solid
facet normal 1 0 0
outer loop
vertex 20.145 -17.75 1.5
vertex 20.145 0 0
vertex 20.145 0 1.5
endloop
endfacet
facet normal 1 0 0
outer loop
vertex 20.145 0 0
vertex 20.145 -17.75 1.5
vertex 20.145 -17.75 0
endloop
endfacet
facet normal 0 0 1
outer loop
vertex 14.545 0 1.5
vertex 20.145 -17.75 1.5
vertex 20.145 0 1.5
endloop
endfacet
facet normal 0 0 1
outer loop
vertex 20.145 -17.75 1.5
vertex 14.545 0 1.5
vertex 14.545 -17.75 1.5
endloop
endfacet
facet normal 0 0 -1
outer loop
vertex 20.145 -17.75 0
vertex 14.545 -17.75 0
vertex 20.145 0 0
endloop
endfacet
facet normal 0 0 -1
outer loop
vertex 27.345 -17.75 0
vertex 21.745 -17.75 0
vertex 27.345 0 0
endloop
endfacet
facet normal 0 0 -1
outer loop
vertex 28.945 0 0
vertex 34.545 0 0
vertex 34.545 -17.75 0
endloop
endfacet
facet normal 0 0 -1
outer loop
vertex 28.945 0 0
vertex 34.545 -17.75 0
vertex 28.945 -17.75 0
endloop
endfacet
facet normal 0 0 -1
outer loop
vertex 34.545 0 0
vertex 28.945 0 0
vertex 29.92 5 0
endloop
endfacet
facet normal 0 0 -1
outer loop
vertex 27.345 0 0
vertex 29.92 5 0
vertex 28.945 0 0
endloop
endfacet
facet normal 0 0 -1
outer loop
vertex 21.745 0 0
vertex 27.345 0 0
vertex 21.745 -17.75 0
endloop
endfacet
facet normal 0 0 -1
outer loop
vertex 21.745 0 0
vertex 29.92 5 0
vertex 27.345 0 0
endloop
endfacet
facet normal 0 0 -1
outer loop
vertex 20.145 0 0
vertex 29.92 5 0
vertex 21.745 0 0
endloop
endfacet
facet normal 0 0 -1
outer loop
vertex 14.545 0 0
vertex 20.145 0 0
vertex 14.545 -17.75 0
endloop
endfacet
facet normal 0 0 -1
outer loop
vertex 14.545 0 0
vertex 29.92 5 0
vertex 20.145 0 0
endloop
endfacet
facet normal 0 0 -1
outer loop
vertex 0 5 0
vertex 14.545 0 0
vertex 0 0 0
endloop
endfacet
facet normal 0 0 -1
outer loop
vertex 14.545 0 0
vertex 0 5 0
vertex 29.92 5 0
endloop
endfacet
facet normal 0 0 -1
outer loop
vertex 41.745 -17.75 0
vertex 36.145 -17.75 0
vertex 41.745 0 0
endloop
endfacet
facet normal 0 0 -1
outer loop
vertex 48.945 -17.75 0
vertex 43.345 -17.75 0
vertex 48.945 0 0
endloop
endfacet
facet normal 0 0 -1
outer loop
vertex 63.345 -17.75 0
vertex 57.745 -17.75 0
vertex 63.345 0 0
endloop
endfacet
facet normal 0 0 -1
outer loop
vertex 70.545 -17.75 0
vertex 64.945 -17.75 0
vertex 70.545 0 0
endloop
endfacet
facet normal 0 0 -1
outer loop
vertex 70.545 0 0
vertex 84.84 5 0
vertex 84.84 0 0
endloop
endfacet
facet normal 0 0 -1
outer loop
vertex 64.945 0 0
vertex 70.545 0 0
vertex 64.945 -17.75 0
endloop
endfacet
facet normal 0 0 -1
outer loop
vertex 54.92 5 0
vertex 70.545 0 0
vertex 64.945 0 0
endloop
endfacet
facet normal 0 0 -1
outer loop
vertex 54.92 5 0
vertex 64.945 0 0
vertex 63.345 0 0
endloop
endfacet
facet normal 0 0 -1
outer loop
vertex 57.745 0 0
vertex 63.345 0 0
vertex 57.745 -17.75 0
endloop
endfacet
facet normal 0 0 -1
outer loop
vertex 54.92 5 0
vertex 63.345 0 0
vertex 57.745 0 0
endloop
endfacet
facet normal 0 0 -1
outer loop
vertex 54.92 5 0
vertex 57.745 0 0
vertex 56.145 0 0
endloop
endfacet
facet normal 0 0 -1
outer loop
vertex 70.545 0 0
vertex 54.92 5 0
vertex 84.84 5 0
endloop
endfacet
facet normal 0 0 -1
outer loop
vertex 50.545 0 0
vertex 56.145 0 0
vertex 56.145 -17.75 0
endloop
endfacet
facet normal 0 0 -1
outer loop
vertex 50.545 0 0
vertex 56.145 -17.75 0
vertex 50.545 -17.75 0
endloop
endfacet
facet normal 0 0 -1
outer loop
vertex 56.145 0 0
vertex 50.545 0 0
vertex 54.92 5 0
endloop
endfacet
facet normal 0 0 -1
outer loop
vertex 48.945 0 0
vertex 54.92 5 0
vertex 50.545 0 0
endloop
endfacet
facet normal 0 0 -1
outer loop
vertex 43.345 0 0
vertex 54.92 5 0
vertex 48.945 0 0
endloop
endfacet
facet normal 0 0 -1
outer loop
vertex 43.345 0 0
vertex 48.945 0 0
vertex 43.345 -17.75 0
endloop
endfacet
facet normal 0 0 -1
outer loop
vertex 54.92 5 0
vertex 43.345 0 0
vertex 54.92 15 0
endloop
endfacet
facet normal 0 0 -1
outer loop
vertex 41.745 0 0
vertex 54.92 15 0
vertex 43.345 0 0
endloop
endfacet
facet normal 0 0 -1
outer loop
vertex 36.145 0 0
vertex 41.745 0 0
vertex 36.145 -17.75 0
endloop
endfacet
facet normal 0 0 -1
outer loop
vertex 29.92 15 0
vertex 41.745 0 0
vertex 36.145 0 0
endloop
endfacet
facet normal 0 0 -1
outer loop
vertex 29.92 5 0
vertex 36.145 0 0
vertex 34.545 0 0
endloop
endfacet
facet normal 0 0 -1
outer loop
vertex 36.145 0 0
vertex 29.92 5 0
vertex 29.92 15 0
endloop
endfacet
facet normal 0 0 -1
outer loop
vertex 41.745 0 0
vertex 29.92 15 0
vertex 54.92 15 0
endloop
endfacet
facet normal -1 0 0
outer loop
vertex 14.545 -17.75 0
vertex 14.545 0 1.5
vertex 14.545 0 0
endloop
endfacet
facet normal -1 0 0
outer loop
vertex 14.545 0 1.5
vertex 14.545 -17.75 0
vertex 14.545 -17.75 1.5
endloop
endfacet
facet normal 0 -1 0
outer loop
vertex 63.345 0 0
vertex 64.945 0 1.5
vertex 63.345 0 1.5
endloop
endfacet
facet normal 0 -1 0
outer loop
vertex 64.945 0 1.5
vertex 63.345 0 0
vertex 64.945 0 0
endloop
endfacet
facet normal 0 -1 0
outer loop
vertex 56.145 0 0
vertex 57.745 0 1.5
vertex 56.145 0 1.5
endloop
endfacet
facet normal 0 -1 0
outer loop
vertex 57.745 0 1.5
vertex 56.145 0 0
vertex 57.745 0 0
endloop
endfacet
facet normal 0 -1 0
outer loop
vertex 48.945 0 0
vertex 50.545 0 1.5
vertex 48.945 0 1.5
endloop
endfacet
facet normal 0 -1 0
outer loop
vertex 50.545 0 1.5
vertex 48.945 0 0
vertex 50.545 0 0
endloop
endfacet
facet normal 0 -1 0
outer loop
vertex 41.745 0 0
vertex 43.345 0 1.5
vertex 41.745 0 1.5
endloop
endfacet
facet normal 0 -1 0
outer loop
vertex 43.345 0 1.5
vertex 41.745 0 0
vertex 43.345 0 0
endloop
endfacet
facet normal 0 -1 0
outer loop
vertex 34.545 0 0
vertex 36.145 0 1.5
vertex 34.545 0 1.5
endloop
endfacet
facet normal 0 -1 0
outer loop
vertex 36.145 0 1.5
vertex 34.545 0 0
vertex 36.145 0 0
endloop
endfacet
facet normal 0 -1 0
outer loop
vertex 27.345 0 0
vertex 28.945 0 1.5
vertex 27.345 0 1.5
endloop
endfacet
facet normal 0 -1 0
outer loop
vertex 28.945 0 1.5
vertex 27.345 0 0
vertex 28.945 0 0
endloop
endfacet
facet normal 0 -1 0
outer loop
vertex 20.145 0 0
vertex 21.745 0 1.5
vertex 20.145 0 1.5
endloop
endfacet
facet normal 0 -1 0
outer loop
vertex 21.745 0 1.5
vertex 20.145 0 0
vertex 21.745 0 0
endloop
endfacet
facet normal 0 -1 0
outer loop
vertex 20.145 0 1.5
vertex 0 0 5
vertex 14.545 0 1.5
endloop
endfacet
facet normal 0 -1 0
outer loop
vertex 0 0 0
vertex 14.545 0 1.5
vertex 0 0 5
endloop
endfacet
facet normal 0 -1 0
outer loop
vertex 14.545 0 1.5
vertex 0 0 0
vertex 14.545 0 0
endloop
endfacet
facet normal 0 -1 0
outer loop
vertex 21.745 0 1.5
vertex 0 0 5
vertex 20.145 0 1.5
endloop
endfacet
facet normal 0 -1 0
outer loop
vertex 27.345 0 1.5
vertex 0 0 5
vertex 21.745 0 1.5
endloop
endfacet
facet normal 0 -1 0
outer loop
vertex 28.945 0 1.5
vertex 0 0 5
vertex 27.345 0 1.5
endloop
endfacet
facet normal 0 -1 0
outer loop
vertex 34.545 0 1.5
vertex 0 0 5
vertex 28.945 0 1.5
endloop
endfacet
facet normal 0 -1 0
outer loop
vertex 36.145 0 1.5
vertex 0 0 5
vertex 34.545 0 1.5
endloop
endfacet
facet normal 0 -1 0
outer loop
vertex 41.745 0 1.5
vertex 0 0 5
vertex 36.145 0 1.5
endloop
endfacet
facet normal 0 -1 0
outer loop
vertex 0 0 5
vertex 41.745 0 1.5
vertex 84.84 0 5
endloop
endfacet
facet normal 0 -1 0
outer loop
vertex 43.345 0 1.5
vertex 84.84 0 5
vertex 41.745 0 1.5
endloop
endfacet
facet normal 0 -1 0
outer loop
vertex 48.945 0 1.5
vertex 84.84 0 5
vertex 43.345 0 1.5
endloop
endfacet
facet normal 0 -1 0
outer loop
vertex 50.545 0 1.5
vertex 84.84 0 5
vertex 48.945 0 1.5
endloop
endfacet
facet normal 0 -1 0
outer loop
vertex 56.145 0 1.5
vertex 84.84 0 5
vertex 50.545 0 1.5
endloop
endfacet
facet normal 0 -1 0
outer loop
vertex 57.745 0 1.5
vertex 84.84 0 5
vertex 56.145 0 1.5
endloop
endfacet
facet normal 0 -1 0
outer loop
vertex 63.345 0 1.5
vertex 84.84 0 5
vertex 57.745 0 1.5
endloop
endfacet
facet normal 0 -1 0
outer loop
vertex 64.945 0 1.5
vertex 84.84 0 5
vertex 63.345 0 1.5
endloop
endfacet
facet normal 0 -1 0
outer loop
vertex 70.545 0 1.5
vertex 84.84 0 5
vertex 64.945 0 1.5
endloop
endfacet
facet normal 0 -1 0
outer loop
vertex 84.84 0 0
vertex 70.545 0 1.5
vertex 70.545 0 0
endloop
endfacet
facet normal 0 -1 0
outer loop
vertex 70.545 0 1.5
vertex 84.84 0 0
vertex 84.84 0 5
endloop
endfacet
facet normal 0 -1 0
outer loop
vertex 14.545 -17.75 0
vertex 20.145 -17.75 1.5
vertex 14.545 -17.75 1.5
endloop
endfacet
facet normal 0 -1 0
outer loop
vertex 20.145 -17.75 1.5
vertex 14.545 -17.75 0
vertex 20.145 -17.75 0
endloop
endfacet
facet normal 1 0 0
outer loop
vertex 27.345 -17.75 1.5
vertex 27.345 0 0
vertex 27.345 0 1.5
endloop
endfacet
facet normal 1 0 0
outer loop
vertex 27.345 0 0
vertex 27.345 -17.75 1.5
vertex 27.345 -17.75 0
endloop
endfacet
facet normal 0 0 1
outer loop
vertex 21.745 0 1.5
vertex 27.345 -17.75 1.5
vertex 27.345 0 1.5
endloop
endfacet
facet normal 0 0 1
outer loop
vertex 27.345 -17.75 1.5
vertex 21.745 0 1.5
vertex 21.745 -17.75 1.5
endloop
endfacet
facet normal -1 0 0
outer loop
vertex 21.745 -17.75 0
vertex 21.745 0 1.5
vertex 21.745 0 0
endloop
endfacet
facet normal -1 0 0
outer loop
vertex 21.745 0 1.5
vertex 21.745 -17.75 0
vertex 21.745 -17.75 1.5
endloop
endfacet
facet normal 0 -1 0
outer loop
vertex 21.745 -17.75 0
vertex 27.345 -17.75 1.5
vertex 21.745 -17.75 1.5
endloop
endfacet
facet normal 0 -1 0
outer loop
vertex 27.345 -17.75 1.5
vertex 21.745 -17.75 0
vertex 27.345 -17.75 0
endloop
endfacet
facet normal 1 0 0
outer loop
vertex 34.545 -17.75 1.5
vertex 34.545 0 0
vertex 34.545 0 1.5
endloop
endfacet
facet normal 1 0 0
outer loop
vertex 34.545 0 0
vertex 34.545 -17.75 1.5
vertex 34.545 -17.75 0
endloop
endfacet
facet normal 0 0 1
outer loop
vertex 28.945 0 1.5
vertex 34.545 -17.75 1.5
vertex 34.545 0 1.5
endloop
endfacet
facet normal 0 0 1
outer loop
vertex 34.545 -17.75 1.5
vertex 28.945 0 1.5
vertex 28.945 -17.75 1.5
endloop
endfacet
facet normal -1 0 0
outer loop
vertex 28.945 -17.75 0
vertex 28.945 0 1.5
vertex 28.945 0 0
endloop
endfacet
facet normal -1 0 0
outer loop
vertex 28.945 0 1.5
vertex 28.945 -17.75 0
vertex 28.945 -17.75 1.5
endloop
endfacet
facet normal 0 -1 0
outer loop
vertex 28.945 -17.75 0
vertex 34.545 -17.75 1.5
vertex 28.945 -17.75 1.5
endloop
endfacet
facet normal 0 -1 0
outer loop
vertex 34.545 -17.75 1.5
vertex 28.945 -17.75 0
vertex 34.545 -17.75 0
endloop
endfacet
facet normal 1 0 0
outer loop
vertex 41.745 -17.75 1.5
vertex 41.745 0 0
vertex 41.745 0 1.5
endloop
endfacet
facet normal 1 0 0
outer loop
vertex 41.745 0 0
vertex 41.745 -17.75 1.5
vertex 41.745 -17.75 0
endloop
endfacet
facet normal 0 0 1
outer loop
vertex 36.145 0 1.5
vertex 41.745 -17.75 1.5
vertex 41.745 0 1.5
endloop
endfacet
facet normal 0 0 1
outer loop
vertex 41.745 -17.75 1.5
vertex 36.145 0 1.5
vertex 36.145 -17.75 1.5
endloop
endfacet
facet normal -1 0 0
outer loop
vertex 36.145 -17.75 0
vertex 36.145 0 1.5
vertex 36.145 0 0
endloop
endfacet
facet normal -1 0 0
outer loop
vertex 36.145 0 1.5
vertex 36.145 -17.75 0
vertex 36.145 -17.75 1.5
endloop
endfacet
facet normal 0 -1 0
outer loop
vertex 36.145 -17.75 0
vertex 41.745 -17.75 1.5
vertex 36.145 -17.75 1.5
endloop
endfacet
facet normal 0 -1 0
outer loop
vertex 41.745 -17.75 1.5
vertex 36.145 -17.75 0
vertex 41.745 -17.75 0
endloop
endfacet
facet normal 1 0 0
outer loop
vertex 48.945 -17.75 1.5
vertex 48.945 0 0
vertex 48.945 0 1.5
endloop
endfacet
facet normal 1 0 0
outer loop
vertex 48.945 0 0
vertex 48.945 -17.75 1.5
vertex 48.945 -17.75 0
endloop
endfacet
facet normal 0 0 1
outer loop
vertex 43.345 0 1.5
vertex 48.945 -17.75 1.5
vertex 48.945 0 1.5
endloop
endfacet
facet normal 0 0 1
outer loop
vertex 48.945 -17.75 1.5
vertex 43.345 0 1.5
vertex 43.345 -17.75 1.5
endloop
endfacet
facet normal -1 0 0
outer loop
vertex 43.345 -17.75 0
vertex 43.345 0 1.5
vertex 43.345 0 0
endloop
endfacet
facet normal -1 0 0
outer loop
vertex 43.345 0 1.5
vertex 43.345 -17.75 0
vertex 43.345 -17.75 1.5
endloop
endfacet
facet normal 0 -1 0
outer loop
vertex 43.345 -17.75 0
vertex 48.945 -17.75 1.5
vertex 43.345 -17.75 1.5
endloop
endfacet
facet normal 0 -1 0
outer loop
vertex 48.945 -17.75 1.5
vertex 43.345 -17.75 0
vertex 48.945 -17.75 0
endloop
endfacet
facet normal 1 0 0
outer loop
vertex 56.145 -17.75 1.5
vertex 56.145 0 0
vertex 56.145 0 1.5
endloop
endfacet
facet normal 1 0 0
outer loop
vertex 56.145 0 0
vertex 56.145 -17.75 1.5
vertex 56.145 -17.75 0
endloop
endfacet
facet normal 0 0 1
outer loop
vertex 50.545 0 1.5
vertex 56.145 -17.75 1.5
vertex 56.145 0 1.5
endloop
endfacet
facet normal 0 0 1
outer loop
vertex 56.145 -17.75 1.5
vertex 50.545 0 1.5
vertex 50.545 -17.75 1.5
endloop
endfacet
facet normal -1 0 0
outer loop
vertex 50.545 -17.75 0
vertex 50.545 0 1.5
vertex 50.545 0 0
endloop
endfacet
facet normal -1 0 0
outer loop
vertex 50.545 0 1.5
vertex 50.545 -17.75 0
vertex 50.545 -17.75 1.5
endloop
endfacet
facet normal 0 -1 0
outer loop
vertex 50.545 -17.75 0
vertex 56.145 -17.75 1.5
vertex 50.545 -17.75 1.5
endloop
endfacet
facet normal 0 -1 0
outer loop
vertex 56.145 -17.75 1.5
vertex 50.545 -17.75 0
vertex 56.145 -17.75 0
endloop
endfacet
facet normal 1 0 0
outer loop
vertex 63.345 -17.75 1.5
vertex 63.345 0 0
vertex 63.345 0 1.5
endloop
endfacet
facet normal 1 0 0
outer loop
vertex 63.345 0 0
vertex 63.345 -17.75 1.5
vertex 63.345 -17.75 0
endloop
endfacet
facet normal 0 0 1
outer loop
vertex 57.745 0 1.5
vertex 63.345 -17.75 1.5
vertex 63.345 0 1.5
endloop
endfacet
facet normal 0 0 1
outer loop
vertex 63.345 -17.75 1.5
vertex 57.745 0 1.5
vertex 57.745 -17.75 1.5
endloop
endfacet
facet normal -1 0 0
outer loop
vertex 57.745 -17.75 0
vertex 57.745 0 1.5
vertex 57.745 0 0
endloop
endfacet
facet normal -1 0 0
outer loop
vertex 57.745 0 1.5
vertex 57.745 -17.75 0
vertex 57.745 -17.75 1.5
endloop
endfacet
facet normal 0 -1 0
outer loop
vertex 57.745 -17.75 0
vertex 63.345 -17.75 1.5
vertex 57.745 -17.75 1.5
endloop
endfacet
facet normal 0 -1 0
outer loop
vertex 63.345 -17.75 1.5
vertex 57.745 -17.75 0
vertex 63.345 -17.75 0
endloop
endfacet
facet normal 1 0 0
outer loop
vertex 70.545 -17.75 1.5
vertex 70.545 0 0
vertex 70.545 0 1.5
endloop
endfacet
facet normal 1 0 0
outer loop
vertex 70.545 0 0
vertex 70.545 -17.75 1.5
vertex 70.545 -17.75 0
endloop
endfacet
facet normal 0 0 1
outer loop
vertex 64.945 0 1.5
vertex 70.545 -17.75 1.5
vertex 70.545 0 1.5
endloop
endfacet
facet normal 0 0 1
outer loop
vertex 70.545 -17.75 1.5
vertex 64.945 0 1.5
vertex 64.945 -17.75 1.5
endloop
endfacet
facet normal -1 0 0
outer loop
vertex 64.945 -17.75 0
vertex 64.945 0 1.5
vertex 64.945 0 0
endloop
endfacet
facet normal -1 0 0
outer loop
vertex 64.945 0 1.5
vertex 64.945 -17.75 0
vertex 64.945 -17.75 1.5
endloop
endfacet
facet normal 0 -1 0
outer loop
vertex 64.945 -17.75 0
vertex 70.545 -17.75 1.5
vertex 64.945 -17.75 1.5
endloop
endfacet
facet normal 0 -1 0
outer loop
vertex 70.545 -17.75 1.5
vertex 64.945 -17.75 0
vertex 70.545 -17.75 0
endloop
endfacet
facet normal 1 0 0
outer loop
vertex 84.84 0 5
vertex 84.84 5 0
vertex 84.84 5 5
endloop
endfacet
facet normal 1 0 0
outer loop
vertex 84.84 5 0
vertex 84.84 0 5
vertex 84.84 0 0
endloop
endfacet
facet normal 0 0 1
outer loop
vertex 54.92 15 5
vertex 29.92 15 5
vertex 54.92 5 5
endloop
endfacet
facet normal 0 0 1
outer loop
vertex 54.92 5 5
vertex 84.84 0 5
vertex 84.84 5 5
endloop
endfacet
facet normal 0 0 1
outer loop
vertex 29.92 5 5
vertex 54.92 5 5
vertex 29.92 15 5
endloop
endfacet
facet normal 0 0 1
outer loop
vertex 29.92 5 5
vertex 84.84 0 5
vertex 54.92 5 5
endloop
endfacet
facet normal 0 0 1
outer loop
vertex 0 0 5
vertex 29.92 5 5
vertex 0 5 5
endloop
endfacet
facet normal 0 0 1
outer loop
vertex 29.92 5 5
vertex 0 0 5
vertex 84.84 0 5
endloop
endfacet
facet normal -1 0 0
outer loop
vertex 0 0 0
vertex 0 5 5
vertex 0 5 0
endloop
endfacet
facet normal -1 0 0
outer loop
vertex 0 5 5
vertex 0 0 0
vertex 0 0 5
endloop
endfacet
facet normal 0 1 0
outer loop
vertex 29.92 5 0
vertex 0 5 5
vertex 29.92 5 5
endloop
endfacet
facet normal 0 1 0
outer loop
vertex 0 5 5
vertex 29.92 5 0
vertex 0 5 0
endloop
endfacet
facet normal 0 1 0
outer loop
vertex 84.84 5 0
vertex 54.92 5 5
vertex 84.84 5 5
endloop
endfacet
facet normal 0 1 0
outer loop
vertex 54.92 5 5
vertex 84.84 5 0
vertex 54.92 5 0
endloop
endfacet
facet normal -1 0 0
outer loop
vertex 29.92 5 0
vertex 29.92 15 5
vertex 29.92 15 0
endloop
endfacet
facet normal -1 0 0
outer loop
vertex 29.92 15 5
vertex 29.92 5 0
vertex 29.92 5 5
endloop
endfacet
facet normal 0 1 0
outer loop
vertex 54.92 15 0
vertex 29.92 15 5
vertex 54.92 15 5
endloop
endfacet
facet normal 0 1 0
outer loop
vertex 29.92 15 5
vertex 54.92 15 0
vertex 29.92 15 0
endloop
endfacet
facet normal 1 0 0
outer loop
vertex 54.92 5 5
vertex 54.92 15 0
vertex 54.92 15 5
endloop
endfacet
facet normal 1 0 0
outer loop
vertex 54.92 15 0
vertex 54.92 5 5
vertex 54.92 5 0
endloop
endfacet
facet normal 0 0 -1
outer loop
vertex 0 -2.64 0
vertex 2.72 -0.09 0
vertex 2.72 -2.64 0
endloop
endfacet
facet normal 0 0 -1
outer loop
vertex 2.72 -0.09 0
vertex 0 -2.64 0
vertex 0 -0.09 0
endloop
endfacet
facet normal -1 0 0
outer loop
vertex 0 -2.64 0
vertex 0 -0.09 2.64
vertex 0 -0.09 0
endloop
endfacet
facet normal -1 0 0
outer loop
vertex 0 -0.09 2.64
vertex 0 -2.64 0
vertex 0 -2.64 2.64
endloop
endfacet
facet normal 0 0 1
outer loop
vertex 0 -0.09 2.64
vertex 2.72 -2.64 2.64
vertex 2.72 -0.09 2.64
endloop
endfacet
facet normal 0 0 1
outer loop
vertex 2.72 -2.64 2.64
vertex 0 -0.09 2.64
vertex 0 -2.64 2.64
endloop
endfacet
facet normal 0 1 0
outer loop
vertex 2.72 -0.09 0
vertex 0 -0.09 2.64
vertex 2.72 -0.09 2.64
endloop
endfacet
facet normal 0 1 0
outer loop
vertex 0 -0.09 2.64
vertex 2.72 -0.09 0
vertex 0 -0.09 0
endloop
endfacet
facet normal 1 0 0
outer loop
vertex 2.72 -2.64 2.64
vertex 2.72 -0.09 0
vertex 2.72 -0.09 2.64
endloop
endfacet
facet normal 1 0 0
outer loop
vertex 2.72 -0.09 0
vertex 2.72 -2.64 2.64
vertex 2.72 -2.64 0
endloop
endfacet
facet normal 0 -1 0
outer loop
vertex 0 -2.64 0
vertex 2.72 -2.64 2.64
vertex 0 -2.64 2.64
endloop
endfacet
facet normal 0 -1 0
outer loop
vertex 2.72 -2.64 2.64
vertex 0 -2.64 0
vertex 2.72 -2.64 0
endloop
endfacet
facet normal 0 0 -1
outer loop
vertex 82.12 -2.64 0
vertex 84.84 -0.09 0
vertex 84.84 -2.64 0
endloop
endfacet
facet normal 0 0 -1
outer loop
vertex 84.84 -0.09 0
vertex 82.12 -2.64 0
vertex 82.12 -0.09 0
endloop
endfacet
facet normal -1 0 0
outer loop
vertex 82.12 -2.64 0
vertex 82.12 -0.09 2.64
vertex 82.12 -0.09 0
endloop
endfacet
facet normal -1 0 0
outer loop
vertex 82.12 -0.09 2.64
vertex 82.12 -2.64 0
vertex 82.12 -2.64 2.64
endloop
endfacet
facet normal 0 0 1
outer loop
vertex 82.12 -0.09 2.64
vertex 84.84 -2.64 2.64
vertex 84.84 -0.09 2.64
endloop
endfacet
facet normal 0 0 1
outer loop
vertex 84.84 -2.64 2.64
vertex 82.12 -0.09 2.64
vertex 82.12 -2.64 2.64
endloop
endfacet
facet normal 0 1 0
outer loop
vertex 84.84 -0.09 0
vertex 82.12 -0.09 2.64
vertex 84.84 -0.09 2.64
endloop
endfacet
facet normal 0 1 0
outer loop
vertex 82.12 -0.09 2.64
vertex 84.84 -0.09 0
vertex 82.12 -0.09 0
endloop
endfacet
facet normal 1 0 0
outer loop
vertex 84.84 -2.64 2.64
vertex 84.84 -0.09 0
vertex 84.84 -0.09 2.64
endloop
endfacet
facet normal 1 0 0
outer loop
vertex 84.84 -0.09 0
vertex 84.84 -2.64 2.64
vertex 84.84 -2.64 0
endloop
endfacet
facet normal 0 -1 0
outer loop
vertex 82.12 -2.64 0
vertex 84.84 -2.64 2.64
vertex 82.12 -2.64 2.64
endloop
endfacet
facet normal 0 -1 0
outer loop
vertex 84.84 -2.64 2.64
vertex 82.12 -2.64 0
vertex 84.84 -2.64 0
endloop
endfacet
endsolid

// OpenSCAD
echo(version=version());

/*
* Customizable Electrophoresis Comb
* 
* Copyright (c) 2016 Adm Chrysler
* www.admchrysler.com
* Licensed under the MIT (MIT-LICENSE.txt) license.
* 
* All values are in millimeters.  Comment or uncomment desired settings.
*
*/

/* Manual settings */
tooth_count = 8; // Number of wells
tooth_width = 5.6; // Width of each tooth
tooth_thickness = 1.5; // Thickness of each tooth
tooth_gap = 1.6; // Spacing between teeth.

tooth_length = 17.75;  // Length of teeth (measured perpendicular from comb)
tooth_margin = 14.545; // Width reserved on either end of comb to be free of teeth.

/*8 Tooth settings
tooth_count = 8; tooth_width = 5.8; tooth_thickness = 1.5; tooth_gap = 1.6; tooth_length = 17.75; tooth_margin = 14.545;*/

/*15 Tooth settings
 tooth_count = 15; tooth_width = 2.8; tooth_thickness = 1.5; tooth_gap = 1.0; tooth_length = 17.75; tooth_margin = 14.545;*/
 
// Compatible with Bio-RAD baths.  Do not modify the following settings  
// unless you are using another manufacture.
// Upper Body
    body_x = 84.84;
    body_z = 5;
    body_y = 5;
// Handle
    handle_x = 25;
    handle_z = 5;
    handle_y = 10;
// Support blocks
    support_x = 2.72;
    support_y = 2.55;
    support_z = 2.64;


/* Translating and building dimensions */ 

// Upper body
    cube([body_x, body_y, body_z], center = false);
// Handle
    translate([(body_x-handle_x)/2, body_y, 0])
    linear_extrude(height = handle_z)
    square([handle_x, handle_y], center = false);
// Support block left
    translate([0, -support_z, 0])
    linear_extrude(height = support_z)
    square([support_x, support_y], center = false);
// Support block right
    translate([body_x-support_x, -support_z, 0])
    linear_extrude(height = support_z)
    square([support_x, support_y], center = false);


// Teeth

union() {
	Core();
	Teeth();
}

module Core() {
	union() {
	}
}

module Teeth(height) {
	translate([0, 0, 0]) union() {
		for(i = [0:tooth_count-1]) {
			translate([i * (tooth_width + tooth_gap), 0, 0]) Tooth(tooth_width, tooth_length, tooth_thickness);
		}
	}
} 

module Tooth(width, length, height) {
	translate([tooth_margin, -length, 0]) 
    cube([width, length, height], center=false);
}

module Margin(length) {
	translate([0, 0, 0]) union() {
		for(i = [0:tooth_count-1]) {
			translate([i * (tooth_width + tooth_gap), 0, 0]) Tooth(tooth_width, tooth_length, height);
		}
	}
}


// references from http://gelcombs.com/products/single-gel-combs.php
